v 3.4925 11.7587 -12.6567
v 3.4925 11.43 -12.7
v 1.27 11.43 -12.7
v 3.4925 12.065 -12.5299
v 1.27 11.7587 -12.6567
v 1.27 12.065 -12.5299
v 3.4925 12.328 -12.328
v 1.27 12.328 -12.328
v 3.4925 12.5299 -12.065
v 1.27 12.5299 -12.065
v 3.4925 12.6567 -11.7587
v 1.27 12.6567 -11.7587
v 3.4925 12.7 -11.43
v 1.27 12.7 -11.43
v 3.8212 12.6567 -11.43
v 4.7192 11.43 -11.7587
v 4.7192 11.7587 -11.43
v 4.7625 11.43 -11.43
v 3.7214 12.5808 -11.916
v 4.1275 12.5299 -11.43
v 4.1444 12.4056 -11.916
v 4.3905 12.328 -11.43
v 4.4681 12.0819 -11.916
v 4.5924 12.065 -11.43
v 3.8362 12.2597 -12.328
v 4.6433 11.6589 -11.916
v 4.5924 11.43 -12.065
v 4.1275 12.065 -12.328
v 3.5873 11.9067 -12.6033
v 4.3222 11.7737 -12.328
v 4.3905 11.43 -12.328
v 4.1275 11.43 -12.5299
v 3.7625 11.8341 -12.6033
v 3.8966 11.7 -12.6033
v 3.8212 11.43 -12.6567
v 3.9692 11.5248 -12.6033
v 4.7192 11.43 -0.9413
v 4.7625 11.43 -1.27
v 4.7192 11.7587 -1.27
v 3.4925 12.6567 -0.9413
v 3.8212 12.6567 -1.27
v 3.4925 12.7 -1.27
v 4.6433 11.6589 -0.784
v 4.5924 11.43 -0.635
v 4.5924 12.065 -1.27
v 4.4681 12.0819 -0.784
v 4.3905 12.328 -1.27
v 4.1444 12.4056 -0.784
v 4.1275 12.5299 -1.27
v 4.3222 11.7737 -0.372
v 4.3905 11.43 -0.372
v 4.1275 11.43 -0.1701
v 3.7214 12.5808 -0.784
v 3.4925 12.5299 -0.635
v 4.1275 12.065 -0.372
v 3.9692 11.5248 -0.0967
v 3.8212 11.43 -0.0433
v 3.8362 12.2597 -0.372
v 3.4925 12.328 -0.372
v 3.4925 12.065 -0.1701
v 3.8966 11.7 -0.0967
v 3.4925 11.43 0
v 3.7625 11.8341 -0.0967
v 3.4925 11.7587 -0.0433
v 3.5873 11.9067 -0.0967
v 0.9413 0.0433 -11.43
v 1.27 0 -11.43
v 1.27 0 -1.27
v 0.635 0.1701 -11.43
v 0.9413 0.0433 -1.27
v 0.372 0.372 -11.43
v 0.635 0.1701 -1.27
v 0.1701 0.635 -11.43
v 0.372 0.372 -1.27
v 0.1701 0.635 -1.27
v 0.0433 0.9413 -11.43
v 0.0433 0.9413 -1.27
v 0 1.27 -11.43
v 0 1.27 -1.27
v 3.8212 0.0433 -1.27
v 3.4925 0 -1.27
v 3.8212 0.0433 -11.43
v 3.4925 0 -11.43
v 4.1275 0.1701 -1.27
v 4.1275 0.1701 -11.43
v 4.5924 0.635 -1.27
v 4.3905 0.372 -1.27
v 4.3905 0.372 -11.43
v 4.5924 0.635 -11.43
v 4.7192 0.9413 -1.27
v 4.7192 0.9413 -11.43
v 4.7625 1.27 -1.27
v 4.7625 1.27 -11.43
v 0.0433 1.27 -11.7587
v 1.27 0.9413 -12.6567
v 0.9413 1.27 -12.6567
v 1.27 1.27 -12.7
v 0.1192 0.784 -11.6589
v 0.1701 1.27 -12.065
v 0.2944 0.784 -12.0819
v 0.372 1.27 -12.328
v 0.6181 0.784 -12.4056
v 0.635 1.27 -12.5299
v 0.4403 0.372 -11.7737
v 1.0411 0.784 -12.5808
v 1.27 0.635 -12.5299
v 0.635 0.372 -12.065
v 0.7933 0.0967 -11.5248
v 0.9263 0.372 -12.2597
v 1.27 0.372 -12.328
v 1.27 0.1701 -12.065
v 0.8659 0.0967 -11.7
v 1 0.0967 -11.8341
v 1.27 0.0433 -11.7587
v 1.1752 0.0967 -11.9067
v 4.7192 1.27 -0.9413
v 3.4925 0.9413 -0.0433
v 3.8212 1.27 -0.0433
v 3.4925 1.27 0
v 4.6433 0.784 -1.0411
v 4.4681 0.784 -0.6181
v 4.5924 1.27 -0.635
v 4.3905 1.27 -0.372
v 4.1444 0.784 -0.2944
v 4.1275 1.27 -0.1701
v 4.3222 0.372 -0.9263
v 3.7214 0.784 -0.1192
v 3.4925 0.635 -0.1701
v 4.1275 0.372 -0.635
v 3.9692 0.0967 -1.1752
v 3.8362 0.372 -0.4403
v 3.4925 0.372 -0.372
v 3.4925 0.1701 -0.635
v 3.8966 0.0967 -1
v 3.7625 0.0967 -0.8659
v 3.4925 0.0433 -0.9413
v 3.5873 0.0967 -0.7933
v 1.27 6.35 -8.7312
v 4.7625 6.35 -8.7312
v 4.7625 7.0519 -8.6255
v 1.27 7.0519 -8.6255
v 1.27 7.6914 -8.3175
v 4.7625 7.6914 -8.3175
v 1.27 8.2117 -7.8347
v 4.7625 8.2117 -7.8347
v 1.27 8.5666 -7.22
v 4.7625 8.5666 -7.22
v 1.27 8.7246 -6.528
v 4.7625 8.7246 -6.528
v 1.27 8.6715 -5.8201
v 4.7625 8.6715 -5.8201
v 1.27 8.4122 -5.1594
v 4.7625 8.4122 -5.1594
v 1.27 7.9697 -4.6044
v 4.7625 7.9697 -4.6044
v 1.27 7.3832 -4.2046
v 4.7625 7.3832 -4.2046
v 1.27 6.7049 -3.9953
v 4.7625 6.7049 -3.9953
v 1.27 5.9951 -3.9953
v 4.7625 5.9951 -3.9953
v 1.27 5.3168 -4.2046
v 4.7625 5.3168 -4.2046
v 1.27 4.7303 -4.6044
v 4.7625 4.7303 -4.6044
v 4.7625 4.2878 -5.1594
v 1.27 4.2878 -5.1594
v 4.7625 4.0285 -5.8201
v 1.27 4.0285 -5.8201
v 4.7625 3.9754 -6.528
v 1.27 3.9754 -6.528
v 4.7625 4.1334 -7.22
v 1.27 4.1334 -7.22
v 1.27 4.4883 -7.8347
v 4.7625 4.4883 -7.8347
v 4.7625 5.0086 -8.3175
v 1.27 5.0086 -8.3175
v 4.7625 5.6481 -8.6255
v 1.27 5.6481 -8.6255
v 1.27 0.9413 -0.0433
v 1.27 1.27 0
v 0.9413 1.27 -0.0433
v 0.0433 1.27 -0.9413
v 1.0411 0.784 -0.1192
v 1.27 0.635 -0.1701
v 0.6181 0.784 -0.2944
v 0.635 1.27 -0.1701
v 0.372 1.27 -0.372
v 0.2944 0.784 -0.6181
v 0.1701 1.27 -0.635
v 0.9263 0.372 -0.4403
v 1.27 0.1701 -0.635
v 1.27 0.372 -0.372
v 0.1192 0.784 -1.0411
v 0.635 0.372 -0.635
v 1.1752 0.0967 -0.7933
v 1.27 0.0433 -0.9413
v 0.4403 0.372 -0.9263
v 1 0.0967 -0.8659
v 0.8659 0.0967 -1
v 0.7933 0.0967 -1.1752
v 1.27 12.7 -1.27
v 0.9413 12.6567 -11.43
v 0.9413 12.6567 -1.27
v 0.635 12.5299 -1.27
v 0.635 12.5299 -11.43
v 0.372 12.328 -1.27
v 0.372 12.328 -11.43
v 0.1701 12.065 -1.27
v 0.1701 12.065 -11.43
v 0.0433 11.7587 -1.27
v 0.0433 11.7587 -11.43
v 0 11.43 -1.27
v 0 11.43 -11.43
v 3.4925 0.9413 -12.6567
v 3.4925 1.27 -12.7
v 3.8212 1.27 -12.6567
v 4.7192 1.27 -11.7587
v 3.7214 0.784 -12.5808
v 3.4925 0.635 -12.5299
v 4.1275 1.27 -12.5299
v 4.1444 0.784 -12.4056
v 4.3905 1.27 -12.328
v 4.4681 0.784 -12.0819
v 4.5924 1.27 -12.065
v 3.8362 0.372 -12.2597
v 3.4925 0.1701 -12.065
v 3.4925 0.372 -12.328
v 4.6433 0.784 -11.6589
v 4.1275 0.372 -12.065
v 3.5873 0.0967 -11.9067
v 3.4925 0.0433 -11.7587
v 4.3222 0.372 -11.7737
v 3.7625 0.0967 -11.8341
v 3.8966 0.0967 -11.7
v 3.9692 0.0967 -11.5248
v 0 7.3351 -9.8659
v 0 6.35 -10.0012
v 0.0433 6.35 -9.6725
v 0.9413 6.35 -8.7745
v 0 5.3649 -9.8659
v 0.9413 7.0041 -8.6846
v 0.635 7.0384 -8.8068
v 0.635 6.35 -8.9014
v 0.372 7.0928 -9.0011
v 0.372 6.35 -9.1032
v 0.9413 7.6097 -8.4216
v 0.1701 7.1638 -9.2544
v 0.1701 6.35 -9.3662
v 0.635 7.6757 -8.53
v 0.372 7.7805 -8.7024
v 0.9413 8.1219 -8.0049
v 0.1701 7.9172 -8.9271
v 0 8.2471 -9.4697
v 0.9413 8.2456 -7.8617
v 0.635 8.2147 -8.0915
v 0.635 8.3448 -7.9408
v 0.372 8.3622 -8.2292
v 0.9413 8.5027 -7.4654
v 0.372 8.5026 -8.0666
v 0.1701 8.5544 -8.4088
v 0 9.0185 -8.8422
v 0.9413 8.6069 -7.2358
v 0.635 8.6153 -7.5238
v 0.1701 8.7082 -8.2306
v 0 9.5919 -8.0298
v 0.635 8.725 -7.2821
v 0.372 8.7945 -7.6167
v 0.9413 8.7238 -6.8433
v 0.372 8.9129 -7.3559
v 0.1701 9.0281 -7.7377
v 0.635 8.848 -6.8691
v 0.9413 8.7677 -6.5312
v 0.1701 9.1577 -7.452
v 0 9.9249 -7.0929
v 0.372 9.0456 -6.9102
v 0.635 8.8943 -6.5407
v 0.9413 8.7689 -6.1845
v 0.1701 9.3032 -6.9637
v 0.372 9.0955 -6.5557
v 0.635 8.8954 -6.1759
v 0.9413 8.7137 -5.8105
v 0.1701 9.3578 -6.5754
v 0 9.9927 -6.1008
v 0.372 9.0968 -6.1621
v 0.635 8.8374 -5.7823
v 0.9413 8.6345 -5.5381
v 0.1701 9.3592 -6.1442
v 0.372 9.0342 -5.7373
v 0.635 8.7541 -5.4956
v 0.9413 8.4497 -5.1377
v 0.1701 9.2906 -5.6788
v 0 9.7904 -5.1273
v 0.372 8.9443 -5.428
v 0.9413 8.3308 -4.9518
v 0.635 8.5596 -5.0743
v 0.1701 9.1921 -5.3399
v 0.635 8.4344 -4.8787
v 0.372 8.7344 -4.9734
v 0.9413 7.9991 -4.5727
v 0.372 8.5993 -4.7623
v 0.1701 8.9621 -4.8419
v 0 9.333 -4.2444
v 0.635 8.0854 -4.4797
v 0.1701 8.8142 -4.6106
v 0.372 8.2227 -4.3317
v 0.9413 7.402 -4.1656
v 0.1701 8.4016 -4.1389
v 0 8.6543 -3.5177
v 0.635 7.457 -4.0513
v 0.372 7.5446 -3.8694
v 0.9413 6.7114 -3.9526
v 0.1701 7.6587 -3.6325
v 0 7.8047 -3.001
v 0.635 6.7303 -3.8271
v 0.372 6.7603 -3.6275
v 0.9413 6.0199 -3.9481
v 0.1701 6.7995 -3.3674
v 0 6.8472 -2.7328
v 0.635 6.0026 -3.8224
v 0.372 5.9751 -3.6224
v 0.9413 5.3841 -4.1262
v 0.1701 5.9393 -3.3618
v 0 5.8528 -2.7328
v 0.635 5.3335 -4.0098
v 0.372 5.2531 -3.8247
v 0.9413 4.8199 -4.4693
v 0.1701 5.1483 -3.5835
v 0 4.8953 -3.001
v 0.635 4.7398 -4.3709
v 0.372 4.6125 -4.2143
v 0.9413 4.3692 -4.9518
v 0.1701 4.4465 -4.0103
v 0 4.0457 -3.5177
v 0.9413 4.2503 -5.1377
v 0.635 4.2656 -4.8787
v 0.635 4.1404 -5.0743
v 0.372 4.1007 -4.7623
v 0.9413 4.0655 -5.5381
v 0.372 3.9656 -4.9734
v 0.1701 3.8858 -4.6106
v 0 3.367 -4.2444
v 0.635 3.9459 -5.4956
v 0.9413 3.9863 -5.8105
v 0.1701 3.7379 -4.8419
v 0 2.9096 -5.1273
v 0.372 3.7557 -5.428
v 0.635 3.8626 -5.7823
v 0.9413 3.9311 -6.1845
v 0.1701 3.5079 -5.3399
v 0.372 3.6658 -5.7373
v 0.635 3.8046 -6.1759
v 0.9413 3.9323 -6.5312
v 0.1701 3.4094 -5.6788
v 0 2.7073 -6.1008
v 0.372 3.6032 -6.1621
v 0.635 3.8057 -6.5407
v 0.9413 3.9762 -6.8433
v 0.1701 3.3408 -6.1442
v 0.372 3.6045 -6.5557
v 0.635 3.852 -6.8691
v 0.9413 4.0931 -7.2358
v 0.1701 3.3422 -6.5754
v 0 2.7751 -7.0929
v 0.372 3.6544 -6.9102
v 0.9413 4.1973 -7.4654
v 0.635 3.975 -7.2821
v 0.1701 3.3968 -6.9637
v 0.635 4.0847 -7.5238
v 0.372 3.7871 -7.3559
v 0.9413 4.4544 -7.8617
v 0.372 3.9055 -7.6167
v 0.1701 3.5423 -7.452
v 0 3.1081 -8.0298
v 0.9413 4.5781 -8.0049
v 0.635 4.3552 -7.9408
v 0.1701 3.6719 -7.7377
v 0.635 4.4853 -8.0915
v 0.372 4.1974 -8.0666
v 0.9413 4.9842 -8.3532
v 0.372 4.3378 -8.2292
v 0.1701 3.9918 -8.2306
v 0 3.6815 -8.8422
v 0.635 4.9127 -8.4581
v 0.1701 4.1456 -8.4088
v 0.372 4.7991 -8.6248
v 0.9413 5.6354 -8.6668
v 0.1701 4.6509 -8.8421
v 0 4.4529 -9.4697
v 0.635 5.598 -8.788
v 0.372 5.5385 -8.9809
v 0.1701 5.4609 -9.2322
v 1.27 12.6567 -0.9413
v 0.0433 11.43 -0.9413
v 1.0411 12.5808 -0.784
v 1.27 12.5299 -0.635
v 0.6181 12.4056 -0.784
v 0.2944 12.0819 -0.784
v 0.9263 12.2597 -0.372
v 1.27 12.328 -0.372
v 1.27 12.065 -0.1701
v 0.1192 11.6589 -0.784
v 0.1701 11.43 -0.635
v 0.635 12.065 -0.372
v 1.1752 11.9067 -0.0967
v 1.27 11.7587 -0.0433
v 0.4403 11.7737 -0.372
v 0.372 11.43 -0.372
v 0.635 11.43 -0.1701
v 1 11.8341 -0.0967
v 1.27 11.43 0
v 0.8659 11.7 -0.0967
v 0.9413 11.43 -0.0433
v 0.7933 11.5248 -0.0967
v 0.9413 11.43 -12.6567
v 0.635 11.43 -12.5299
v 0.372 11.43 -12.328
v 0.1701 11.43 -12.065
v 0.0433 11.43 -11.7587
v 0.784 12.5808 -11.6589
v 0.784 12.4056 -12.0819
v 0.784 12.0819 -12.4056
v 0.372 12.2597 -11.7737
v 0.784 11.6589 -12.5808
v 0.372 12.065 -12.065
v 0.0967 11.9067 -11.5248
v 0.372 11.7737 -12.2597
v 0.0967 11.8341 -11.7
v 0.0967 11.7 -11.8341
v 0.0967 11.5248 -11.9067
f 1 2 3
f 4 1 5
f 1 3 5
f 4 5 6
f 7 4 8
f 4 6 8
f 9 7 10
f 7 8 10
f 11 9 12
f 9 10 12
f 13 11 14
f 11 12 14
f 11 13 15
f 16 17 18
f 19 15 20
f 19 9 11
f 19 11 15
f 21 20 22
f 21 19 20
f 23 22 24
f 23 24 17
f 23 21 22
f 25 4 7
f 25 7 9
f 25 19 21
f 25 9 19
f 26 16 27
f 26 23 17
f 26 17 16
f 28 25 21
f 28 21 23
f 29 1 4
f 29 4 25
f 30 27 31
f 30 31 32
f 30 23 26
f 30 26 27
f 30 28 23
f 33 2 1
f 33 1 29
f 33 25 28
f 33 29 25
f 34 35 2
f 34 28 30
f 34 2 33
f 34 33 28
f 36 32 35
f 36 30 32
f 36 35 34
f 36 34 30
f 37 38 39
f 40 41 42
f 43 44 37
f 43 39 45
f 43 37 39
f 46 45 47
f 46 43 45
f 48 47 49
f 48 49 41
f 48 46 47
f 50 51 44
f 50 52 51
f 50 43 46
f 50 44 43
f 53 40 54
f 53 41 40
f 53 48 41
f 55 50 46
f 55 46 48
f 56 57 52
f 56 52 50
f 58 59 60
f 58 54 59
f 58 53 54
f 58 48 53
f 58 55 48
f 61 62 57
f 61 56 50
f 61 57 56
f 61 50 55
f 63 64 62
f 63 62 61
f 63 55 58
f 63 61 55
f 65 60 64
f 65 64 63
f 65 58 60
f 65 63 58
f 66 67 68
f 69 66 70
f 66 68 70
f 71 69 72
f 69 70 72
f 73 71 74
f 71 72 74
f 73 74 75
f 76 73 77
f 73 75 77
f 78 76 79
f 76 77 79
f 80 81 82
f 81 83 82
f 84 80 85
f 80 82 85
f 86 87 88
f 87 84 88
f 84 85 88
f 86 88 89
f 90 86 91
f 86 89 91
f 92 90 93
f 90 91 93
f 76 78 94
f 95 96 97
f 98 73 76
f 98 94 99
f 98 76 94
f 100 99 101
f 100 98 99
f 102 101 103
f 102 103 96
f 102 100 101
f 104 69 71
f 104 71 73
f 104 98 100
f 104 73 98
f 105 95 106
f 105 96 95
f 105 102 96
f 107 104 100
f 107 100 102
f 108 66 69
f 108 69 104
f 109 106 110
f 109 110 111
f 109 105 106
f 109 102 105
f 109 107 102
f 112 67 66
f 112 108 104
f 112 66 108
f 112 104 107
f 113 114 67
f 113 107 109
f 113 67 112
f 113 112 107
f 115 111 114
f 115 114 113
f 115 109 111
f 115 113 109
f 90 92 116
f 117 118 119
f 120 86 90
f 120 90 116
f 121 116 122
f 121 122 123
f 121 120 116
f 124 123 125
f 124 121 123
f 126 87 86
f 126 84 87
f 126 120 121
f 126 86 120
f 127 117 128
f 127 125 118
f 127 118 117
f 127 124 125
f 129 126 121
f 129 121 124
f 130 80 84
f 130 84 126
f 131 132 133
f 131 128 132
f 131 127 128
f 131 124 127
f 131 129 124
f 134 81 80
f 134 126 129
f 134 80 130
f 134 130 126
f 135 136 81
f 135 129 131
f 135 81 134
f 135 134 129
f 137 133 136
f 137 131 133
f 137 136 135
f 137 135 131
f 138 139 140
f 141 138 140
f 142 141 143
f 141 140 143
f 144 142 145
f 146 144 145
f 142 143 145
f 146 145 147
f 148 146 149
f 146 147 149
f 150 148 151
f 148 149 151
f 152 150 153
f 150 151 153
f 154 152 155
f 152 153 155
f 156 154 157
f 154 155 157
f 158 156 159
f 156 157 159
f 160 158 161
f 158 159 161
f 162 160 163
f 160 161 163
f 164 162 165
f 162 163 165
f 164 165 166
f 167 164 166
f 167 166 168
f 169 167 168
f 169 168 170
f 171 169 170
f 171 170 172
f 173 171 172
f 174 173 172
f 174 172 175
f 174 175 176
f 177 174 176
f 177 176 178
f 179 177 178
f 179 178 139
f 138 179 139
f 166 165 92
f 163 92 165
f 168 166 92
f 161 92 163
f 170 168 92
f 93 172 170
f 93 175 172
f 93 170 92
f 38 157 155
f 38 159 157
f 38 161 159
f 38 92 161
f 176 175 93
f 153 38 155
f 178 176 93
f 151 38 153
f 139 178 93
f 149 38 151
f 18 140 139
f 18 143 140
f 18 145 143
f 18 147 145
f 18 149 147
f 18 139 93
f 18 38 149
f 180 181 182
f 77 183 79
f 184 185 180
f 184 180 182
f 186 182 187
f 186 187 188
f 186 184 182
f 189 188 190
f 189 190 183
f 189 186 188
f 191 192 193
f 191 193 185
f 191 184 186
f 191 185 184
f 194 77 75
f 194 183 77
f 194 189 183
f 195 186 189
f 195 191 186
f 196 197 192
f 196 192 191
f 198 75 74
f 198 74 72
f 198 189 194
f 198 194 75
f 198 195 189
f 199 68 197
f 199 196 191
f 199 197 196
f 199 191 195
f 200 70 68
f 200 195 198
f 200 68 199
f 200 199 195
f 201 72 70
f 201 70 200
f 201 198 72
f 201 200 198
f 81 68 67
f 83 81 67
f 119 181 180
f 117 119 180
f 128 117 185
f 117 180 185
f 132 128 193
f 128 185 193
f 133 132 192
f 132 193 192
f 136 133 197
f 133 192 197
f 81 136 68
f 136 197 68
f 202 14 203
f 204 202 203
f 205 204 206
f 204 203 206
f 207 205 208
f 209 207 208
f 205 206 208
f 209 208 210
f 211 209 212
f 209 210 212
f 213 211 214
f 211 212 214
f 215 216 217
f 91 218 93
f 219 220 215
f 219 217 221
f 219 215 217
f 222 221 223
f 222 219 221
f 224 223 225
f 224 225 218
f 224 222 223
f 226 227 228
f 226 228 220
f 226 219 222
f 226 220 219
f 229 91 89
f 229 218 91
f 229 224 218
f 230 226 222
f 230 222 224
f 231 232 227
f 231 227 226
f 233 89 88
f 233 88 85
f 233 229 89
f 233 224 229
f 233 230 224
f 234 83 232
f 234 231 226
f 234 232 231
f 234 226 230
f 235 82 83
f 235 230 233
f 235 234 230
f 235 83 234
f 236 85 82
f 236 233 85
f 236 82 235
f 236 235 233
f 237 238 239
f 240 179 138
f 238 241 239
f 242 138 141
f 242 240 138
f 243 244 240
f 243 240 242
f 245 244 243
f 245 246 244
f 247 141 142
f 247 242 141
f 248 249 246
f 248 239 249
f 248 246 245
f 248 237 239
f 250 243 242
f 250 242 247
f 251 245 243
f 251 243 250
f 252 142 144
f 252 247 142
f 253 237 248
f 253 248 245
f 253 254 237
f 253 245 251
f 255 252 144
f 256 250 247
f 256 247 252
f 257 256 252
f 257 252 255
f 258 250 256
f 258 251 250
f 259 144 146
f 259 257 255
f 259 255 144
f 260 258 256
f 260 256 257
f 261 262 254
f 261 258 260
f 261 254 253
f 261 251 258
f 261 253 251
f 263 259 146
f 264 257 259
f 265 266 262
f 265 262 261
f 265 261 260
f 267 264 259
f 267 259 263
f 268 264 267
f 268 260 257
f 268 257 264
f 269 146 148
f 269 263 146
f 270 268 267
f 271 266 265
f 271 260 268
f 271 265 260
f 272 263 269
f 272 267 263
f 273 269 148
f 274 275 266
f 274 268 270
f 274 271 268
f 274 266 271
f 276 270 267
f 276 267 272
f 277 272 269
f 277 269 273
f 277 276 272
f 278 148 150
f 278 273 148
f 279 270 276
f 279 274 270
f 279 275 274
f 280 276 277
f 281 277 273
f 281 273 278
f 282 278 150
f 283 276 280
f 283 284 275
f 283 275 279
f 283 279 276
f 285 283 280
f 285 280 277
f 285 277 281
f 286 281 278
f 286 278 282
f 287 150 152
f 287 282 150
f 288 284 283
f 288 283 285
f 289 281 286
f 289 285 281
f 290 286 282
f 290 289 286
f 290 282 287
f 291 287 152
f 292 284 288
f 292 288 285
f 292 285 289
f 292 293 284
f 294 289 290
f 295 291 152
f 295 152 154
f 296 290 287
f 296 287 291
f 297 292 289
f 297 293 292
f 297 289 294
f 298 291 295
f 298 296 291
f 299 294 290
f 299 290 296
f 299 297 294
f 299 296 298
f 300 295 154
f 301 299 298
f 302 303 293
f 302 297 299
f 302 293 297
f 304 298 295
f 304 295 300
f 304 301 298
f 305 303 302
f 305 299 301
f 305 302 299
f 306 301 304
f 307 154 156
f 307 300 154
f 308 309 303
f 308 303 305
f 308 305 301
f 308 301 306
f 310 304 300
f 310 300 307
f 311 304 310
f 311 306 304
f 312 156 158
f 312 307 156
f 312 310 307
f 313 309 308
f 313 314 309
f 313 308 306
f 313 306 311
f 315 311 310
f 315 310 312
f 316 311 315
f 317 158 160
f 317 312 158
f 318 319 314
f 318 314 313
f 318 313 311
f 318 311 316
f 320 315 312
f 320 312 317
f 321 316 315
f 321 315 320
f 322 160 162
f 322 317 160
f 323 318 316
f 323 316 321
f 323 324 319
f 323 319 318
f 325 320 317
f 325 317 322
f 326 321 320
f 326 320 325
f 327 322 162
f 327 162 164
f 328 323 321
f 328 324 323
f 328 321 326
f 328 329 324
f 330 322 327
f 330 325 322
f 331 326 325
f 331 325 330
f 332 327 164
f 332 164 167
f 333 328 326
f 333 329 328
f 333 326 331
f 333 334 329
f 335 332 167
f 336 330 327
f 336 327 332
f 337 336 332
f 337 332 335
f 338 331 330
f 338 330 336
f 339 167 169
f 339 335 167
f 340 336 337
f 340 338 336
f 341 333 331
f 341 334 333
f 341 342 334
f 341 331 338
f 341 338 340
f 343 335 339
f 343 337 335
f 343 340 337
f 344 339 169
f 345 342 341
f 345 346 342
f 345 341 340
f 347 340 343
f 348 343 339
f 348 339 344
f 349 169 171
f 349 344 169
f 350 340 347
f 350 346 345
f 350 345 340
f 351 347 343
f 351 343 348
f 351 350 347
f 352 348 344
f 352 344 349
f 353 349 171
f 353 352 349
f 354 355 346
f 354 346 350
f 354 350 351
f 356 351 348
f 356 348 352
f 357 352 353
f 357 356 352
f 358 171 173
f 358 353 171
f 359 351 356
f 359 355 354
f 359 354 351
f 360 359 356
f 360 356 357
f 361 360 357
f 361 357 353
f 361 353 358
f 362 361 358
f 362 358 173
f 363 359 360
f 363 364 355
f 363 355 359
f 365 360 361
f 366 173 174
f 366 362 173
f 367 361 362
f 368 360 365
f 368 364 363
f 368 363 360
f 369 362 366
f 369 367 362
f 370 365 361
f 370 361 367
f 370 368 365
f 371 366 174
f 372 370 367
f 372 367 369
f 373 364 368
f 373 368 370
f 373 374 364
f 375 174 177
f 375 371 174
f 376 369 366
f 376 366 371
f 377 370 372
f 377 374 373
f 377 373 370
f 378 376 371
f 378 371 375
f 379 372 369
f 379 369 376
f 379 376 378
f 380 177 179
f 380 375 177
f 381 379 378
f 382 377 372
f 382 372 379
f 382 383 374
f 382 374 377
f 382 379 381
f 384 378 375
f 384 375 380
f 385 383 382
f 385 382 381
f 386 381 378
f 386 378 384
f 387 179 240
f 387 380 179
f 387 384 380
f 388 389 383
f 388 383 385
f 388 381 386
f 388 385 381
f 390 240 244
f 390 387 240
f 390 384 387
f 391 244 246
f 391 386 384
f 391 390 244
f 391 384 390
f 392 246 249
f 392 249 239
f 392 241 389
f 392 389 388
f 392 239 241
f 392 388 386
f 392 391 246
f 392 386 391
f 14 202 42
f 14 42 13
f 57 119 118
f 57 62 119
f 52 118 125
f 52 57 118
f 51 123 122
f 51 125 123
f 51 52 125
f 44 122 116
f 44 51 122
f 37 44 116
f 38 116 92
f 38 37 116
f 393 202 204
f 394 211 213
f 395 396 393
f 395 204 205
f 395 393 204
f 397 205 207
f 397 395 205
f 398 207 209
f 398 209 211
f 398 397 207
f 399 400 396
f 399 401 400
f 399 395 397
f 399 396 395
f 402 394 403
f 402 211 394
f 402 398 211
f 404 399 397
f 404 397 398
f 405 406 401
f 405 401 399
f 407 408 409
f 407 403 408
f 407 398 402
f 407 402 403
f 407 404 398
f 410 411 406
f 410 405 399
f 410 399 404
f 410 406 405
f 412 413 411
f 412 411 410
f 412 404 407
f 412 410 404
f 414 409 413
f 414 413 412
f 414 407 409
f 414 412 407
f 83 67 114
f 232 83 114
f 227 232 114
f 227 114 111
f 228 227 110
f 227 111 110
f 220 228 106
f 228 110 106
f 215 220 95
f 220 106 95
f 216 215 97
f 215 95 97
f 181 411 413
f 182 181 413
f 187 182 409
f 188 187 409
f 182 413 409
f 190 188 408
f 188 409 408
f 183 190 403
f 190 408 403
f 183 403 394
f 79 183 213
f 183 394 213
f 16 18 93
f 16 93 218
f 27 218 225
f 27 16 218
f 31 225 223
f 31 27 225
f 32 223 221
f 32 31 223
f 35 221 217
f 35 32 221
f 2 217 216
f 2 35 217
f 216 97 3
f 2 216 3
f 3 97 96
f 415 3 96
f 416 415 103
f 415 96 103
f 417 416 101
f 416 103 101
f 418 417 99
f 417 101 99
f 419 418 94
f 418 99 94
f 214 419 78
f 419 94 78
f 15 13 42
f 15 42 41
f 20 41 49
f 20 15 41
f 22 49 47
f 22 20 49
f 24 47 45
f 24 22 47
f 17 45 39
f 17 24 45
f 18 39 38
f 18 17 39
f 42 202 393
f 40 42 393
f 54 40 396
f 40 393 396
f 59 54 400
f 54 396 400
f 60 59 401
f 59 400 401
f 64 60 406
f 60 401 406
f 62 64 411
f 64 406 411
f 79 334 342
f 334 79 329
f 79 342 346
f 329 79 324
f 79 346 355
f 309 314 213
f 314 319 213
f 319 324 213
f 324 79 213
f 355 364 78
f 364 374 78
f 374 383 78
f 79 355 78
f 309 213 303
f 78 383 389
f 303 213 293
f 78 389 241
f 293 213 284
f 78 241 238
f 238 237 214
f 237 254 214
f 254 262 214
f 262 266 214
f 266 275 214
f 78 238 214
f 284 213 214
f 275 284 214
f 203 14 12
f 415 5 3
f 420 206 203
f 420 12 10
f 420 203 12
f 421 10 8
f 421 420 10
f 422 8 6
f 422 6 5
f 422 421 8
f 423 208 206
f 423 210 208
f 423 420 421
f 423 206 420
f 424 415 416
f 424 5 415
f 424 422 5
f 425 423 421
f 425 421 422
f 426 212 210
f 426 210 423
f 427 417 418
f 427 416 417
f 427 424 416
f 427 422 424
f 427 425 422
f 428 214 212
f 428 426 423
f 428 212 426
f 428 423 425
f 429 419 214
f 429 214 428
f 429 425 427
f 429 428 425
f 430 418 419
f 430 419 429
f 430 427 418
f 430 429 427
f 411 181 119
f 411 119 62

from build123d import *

# Parameters (mm, degrees)
SKETCH2_W           = 12.7
SKETCH2_H           = 12.7
BOSS_EXTRUDE4_DEPTH = 4.7625
SKETCH3_R           = 2.38125
CUT_EXTRUDE1_DEPTH  = 19.581211108
FILLET1_R           = 1.27
FILLET2_R           = 1.27


with BuildPart() as part:
    # Sketch2 → Boss-Extrude4 (new body)
    with BuildSketch(Plane(origin=(0, 0, 0), x_dir=(0, 0, -1), z_dir=(1, 0, 0))):
        with Locations((6.35, 6.35)):
            Rectangle(SKETCH2_W, SKETCH2_H)
    extrude(amount=BOSS_EXTRUDE4_DEPTH)

    # Sketch3 → Cut-Extrude1 (cut, through all)
    with BuildSketch(Plane(origin=(4.7625, 0, 0), x_dir=(0, 0, -1), z_dir=(1, 0, 0))):
        with Locations((6.35, 6.35)):
            Circle(SKETCH3_R)
    extrude(amount=-CUT_EXTRUDE1_DEPTH, mode=Mode.SUBTRACT)

    # Fillet1
    fillet1_edges = [part.edges().sort_by_distance(p)[0] for p in [
        (4.7625, 6.35, -12.7),
        (4.7625, 12.7, -6.35),
        (4.7625, 6.35, 0),
        (4.7625, 0, -6.35),
    ]]
    fillet(fillet1_edges, radius=FILLET1_R)

    # Fillet2
    # the kernel refuses this fillet: 1.27 mm, written as the material it takes off along each edge
    with BuildSketch(Plane(origin=(3.4925, 1.27, -1.27), x_dir=(0, 0, 1), z_dir=(0, -1, 0))) as fillet2_piece_1_section:
        Polygon((0, 0), (FILLET2_R, 0), (FILLET2_R, -FILLET2_R), (0, -FILLET2_R), align=None)
    fillet2_piece_1 = extrude(amount=FILLET2_R, mode=Mode.PRIVATE)
    fillet2_piece_1 = fillet2_piece_1 - Plane(origin=(3.4925, 1.27, -1.27), x_dir=(-0.7071067811865475, 0, -0.7071067811865475), z_dir=(0, -1, 0)) * Sphere(FILLET2_R, mode=Mode.PRIVATE)
    add(fillet2_piece_1, mode=Mode.SUBTRACT)
    with BuildSketch(Plane(origin=(3.4925, 11.43, -1.27), x_dir=(0, 1, 0), z_dir=(0, 0, 1))) as fillet2_piece_2_section:
        Polygon((0, 0), (FILLET2_R, 0), (FILLET2_R, -FILLET2_R), (0, -FILLET2_R), align=None)
    fillet2_piece_2 = extrude(amount=FILLET2_R, mode=Mode.PRIVATE)
    fillet2_piece_2 = fillet2_piece_2 - Plane(origin=(3.4925, 11.43, -1.27), x_dir=(-0.7071067811865475, -0.7071067811865475, 0), z_dir=(0, 0, 1)) * Sphere(FILLET2_R, mode=Mode.PRIVATE)
    add(fillet2_piece_2, mode=Mode.SUBTRACT)
    with BuildSketch(Plane(origin=(3.4925, 1.27, -11.43), x_dir=(0, 0, -1), z_dir=(0, -1, 0))) as fillet2_piece_3_section:
        Polygon((0, 0), (FILLET2_R, 0), (FILLET2_R, FILLET2_R), (0, FILLET2_R), align=None)
    fillet2_piece_3 = extrude(amount=FILLET2_R, mode=Mode.PRIVATE)
    fillet2_piece_3 = fillet2_piece_3 - Plane(origin=(3.4925, 1.27, -11.43), x_dir=(-0.7071067811865475, 0, 0.7071067811865475), z_dir=(0, -1, 0)) * Sphere(FILLET2_R, mode=Mode.PRIVATE)
    add(fillet2_piece_3, mode=Mode.SUBTRACT)
    with BuildSketch(Plane(origin=(3.4925, 11.43, -11.43), x_dir=(0, 1, 0), z_dir=(0, 0, -1))) as fillet2_piece_4_section:
        Polygon((0, 0), (FILLET2_R, 0), (FILLET2_R, FILLET2_R), (0, FILLET2_R), align=None)
    fillet2_piece_4 = extrude(amount=FILLET2_R, mode=Mode.PRIVATE)
    fillet2_piece_4 = fillet2_piece_4 - Plane(origin=(3.4925, 11.43, -11.43), x_dir=(-0.7071067811865475, -0.7071067811865475, 0), z_dir=(0, 0, -1)) * Sphere(FILLET2_R, mode=Mode.PRIVATE)
    add(fillet2_piece_4, mode=Mode.SUBTRACT)
    with BuildSketch(Plane(origin=(1.27, 11.43, -11.43), x_dir=(0, 0, -1), z_dir=(-1, 0, 0))) as fillet2_piece_5_section:
        Polygon((0, 0), (FILLET2_R, 0), (FILLET2_R, -FILLET2_R), (0, -FILLET2_R), align=None)
    fillet2_piece_5 = extrude(amount=FILLET2_R, mode=Mode.PRIVATE)
    fillet2_piece_5 = fillet2_piece_5 - Plane(origin=(1.27, 11.43, -11.43), x_dir=(0, -0.7071067811865475, 0.7071067811865475), z_dir=(-1, 0, 0)) * Sphere(FILLET2_R, mode=Mode.PRIVATE)
    add(fillet2_piece_5, mode=Mode.SUBTRACT)
    with BuildSketch(Plane(origin=(1.27, 1.27, -11.43), x_dir=(-1, 0, 0), z_dir=(0, -1, 0))) as fillet2_piece_6_section:
        Polygon((0, 0), (FILLET2_R, 0), (FILLET2_R, FILLET2_R), (0, FILLET2_R), align=None)
    fillet2_piece_6 = extrude(amount=FILLET2_R, mode=Mode.PRIVATE)
    fillet2_piece_6 = fillet2_piece_6 - Plane(origin=(1.27, 1.27, -11.43), x_dir=(0.7071067811865475, 0, 0.7071067811865475), z_dir=(0, -1, 0)) * Sphere(FILLET2_R, mode=Mode.PRIVATE)
    add(fillet2_piece_6, mode=Mode.SUBTRACT)
    with BuildSketch(Plane(origin=(1.27, 1.27, -1.27), x_dir=(0, 0, 1), z_dir=(0, -1, 0))) as fillet2_piece_7_section:
        Polygon((0, 0), (FILLET2_R, 0), (FILLET2_R, FILLET2_R), (0, FILLET2_R), align=None)
    fillet2_piece_7 = extrude(amount=FILLET2_R, mode=Mode.PRIVATE)
    fillet2_piece_7 = fillet2_piece_7 - Plane(origin=(1.27, 1.27, -1.27), x_dir=(0.7071067811865475, 0, -0.7071067811865475), z_dir=(0, -1, 0)) * Sphere(FILLET2_R, mode=Mode.PRIVATE)
    add(fillet2_piece_7, mode=Mode.SUBTRACT)
    with BuildSketch(Plane(origin=(1.27, 11.43, -1.27), x_dir=(-1, 0, 0), z_dir=(0, 0, 1))) as fillet2_piece_8_section:
        Polygon((0, 0), (FILLET2_R, 0), (FILLET2_R, -FILLET2_R), (0, -FILLET2_R), align=None)
    fillet2_piece_8 = extrude(amount=FILLET2_R, mode=Mode.PRIVATE)
    fillet2_piece_8 = fillet2_piece_8 - Plane(origin=(1.27, 11.43, -1.27), x_dir=(0.7071067811865475, -0.7071067811865475, 0), z_dir=(0, 0, 1)) * Sphere(FILLET2_R, mode=Mode.PRIVATE)
    add(fillet2_piece_8, mode=Mode.SUBTRACT)
    with BuildSketch(Plane(origin=(0, 6.35, -6.35), x_dir=(0, 0, -1), z_dir=(0, -1, 0))) as fillet2_piece_9:
        with BuildLine():
            CenterArc((2.38125 + FILLET2_R, FILLET2_R), FILLET2_R, 180, 90)
            Line((2.38125, FILLET2_R), (2.38125, 0))
            Line((2.38125, 0), (2.38125 + FILLET2_R, 0))
        make_face()
    revolve(axis=Axis((0, 6.35, -6.35), (1, 0, 0)), mode=Mode.SUBTRACT)
    with BuildSketch(Plane(origin=(1.27, 12.7, -12.7), x_dir=(0, -1, 0), z_dir=(1, 0, 0)), Plane(origin=(1.27, 0, -12.7), x_dir=(0, 0, 1), z_dir=(1, 0, 0))) as fillet2_piece_10:
        with BuildLine():
            CenterArc((FILLET2_R, -FILLET2_R), FILLET2_R, 90, 90)
            Line((0, -FILLET2_R), (0, 0))
            Line((0, 0), (FILLET2_R, 0))
        make_face()
    extrude(amount=2.2225, mode=Mode.SUBTRACT)
    with BuildSketch(Plane(origin=(1.27, 0, 0), x_dir=(0, 0, -1), z_dir=(1, 0, 0)), Plane(origin=(1.27, 12.7, 0), x_dir=(0, -1, 0), z_dir=(1, 0, 0))) as fillet2_piece_11:
        with BuildLine():
            CenterArc((FILLET2_R, FILLET2_R), FILLET2_R, 180, 90)
            Line((0, FILLET2_R), (0, 0))
            Line((0, 0), (FILLET2_R, 0))
        make_face()
    extrude(amount=2.2225, mode=Mode.SUBTRACT)
    with BuildSketch(Plane(origin=(0, 12.7, -11.43), x_dir=(0, -1, 0), z_dir=(0, 0, 1)), Plane(origin=(0, 1.27, -12.7), x_dir=(0, 0, 1), z_dir=(0, 1, 0))) as fillet2_piece_12:
        with BuildLine():
            CenterArc((FILLET2_R, FILLET2_R), FILLET2_R, 180, 90)
            Line((0, FILLET2_R), (0, 0))
            Line((0, 0), (FILLET2_R, 0))
        make_face()
    extrude(amount=10.16, mode=Mode.SUBTRACT)
    with BuildSketch(Plane(origin=(0, 0, -1.27), x_dir=(1, 0, 0), z_dir=(0, 0, -1)), Plane(origin=(0, 11.43, 0), x_dir=(1, 0, 0), z_dir=(0, -1, 0))) as fillet2_piece_13:
        with BuildLine():
            CenterArc((FILLET2_R, -FILLET2_R), FILLET2_R, 90, 90)
            Line((0, -FILLET2_R), (0, 0))
            Line((0, 0), (FILLET2_R, 0))
        make_face()
    extrude(amount=10.16, mode=Mode.SUBTRACT)


solid = part.part
